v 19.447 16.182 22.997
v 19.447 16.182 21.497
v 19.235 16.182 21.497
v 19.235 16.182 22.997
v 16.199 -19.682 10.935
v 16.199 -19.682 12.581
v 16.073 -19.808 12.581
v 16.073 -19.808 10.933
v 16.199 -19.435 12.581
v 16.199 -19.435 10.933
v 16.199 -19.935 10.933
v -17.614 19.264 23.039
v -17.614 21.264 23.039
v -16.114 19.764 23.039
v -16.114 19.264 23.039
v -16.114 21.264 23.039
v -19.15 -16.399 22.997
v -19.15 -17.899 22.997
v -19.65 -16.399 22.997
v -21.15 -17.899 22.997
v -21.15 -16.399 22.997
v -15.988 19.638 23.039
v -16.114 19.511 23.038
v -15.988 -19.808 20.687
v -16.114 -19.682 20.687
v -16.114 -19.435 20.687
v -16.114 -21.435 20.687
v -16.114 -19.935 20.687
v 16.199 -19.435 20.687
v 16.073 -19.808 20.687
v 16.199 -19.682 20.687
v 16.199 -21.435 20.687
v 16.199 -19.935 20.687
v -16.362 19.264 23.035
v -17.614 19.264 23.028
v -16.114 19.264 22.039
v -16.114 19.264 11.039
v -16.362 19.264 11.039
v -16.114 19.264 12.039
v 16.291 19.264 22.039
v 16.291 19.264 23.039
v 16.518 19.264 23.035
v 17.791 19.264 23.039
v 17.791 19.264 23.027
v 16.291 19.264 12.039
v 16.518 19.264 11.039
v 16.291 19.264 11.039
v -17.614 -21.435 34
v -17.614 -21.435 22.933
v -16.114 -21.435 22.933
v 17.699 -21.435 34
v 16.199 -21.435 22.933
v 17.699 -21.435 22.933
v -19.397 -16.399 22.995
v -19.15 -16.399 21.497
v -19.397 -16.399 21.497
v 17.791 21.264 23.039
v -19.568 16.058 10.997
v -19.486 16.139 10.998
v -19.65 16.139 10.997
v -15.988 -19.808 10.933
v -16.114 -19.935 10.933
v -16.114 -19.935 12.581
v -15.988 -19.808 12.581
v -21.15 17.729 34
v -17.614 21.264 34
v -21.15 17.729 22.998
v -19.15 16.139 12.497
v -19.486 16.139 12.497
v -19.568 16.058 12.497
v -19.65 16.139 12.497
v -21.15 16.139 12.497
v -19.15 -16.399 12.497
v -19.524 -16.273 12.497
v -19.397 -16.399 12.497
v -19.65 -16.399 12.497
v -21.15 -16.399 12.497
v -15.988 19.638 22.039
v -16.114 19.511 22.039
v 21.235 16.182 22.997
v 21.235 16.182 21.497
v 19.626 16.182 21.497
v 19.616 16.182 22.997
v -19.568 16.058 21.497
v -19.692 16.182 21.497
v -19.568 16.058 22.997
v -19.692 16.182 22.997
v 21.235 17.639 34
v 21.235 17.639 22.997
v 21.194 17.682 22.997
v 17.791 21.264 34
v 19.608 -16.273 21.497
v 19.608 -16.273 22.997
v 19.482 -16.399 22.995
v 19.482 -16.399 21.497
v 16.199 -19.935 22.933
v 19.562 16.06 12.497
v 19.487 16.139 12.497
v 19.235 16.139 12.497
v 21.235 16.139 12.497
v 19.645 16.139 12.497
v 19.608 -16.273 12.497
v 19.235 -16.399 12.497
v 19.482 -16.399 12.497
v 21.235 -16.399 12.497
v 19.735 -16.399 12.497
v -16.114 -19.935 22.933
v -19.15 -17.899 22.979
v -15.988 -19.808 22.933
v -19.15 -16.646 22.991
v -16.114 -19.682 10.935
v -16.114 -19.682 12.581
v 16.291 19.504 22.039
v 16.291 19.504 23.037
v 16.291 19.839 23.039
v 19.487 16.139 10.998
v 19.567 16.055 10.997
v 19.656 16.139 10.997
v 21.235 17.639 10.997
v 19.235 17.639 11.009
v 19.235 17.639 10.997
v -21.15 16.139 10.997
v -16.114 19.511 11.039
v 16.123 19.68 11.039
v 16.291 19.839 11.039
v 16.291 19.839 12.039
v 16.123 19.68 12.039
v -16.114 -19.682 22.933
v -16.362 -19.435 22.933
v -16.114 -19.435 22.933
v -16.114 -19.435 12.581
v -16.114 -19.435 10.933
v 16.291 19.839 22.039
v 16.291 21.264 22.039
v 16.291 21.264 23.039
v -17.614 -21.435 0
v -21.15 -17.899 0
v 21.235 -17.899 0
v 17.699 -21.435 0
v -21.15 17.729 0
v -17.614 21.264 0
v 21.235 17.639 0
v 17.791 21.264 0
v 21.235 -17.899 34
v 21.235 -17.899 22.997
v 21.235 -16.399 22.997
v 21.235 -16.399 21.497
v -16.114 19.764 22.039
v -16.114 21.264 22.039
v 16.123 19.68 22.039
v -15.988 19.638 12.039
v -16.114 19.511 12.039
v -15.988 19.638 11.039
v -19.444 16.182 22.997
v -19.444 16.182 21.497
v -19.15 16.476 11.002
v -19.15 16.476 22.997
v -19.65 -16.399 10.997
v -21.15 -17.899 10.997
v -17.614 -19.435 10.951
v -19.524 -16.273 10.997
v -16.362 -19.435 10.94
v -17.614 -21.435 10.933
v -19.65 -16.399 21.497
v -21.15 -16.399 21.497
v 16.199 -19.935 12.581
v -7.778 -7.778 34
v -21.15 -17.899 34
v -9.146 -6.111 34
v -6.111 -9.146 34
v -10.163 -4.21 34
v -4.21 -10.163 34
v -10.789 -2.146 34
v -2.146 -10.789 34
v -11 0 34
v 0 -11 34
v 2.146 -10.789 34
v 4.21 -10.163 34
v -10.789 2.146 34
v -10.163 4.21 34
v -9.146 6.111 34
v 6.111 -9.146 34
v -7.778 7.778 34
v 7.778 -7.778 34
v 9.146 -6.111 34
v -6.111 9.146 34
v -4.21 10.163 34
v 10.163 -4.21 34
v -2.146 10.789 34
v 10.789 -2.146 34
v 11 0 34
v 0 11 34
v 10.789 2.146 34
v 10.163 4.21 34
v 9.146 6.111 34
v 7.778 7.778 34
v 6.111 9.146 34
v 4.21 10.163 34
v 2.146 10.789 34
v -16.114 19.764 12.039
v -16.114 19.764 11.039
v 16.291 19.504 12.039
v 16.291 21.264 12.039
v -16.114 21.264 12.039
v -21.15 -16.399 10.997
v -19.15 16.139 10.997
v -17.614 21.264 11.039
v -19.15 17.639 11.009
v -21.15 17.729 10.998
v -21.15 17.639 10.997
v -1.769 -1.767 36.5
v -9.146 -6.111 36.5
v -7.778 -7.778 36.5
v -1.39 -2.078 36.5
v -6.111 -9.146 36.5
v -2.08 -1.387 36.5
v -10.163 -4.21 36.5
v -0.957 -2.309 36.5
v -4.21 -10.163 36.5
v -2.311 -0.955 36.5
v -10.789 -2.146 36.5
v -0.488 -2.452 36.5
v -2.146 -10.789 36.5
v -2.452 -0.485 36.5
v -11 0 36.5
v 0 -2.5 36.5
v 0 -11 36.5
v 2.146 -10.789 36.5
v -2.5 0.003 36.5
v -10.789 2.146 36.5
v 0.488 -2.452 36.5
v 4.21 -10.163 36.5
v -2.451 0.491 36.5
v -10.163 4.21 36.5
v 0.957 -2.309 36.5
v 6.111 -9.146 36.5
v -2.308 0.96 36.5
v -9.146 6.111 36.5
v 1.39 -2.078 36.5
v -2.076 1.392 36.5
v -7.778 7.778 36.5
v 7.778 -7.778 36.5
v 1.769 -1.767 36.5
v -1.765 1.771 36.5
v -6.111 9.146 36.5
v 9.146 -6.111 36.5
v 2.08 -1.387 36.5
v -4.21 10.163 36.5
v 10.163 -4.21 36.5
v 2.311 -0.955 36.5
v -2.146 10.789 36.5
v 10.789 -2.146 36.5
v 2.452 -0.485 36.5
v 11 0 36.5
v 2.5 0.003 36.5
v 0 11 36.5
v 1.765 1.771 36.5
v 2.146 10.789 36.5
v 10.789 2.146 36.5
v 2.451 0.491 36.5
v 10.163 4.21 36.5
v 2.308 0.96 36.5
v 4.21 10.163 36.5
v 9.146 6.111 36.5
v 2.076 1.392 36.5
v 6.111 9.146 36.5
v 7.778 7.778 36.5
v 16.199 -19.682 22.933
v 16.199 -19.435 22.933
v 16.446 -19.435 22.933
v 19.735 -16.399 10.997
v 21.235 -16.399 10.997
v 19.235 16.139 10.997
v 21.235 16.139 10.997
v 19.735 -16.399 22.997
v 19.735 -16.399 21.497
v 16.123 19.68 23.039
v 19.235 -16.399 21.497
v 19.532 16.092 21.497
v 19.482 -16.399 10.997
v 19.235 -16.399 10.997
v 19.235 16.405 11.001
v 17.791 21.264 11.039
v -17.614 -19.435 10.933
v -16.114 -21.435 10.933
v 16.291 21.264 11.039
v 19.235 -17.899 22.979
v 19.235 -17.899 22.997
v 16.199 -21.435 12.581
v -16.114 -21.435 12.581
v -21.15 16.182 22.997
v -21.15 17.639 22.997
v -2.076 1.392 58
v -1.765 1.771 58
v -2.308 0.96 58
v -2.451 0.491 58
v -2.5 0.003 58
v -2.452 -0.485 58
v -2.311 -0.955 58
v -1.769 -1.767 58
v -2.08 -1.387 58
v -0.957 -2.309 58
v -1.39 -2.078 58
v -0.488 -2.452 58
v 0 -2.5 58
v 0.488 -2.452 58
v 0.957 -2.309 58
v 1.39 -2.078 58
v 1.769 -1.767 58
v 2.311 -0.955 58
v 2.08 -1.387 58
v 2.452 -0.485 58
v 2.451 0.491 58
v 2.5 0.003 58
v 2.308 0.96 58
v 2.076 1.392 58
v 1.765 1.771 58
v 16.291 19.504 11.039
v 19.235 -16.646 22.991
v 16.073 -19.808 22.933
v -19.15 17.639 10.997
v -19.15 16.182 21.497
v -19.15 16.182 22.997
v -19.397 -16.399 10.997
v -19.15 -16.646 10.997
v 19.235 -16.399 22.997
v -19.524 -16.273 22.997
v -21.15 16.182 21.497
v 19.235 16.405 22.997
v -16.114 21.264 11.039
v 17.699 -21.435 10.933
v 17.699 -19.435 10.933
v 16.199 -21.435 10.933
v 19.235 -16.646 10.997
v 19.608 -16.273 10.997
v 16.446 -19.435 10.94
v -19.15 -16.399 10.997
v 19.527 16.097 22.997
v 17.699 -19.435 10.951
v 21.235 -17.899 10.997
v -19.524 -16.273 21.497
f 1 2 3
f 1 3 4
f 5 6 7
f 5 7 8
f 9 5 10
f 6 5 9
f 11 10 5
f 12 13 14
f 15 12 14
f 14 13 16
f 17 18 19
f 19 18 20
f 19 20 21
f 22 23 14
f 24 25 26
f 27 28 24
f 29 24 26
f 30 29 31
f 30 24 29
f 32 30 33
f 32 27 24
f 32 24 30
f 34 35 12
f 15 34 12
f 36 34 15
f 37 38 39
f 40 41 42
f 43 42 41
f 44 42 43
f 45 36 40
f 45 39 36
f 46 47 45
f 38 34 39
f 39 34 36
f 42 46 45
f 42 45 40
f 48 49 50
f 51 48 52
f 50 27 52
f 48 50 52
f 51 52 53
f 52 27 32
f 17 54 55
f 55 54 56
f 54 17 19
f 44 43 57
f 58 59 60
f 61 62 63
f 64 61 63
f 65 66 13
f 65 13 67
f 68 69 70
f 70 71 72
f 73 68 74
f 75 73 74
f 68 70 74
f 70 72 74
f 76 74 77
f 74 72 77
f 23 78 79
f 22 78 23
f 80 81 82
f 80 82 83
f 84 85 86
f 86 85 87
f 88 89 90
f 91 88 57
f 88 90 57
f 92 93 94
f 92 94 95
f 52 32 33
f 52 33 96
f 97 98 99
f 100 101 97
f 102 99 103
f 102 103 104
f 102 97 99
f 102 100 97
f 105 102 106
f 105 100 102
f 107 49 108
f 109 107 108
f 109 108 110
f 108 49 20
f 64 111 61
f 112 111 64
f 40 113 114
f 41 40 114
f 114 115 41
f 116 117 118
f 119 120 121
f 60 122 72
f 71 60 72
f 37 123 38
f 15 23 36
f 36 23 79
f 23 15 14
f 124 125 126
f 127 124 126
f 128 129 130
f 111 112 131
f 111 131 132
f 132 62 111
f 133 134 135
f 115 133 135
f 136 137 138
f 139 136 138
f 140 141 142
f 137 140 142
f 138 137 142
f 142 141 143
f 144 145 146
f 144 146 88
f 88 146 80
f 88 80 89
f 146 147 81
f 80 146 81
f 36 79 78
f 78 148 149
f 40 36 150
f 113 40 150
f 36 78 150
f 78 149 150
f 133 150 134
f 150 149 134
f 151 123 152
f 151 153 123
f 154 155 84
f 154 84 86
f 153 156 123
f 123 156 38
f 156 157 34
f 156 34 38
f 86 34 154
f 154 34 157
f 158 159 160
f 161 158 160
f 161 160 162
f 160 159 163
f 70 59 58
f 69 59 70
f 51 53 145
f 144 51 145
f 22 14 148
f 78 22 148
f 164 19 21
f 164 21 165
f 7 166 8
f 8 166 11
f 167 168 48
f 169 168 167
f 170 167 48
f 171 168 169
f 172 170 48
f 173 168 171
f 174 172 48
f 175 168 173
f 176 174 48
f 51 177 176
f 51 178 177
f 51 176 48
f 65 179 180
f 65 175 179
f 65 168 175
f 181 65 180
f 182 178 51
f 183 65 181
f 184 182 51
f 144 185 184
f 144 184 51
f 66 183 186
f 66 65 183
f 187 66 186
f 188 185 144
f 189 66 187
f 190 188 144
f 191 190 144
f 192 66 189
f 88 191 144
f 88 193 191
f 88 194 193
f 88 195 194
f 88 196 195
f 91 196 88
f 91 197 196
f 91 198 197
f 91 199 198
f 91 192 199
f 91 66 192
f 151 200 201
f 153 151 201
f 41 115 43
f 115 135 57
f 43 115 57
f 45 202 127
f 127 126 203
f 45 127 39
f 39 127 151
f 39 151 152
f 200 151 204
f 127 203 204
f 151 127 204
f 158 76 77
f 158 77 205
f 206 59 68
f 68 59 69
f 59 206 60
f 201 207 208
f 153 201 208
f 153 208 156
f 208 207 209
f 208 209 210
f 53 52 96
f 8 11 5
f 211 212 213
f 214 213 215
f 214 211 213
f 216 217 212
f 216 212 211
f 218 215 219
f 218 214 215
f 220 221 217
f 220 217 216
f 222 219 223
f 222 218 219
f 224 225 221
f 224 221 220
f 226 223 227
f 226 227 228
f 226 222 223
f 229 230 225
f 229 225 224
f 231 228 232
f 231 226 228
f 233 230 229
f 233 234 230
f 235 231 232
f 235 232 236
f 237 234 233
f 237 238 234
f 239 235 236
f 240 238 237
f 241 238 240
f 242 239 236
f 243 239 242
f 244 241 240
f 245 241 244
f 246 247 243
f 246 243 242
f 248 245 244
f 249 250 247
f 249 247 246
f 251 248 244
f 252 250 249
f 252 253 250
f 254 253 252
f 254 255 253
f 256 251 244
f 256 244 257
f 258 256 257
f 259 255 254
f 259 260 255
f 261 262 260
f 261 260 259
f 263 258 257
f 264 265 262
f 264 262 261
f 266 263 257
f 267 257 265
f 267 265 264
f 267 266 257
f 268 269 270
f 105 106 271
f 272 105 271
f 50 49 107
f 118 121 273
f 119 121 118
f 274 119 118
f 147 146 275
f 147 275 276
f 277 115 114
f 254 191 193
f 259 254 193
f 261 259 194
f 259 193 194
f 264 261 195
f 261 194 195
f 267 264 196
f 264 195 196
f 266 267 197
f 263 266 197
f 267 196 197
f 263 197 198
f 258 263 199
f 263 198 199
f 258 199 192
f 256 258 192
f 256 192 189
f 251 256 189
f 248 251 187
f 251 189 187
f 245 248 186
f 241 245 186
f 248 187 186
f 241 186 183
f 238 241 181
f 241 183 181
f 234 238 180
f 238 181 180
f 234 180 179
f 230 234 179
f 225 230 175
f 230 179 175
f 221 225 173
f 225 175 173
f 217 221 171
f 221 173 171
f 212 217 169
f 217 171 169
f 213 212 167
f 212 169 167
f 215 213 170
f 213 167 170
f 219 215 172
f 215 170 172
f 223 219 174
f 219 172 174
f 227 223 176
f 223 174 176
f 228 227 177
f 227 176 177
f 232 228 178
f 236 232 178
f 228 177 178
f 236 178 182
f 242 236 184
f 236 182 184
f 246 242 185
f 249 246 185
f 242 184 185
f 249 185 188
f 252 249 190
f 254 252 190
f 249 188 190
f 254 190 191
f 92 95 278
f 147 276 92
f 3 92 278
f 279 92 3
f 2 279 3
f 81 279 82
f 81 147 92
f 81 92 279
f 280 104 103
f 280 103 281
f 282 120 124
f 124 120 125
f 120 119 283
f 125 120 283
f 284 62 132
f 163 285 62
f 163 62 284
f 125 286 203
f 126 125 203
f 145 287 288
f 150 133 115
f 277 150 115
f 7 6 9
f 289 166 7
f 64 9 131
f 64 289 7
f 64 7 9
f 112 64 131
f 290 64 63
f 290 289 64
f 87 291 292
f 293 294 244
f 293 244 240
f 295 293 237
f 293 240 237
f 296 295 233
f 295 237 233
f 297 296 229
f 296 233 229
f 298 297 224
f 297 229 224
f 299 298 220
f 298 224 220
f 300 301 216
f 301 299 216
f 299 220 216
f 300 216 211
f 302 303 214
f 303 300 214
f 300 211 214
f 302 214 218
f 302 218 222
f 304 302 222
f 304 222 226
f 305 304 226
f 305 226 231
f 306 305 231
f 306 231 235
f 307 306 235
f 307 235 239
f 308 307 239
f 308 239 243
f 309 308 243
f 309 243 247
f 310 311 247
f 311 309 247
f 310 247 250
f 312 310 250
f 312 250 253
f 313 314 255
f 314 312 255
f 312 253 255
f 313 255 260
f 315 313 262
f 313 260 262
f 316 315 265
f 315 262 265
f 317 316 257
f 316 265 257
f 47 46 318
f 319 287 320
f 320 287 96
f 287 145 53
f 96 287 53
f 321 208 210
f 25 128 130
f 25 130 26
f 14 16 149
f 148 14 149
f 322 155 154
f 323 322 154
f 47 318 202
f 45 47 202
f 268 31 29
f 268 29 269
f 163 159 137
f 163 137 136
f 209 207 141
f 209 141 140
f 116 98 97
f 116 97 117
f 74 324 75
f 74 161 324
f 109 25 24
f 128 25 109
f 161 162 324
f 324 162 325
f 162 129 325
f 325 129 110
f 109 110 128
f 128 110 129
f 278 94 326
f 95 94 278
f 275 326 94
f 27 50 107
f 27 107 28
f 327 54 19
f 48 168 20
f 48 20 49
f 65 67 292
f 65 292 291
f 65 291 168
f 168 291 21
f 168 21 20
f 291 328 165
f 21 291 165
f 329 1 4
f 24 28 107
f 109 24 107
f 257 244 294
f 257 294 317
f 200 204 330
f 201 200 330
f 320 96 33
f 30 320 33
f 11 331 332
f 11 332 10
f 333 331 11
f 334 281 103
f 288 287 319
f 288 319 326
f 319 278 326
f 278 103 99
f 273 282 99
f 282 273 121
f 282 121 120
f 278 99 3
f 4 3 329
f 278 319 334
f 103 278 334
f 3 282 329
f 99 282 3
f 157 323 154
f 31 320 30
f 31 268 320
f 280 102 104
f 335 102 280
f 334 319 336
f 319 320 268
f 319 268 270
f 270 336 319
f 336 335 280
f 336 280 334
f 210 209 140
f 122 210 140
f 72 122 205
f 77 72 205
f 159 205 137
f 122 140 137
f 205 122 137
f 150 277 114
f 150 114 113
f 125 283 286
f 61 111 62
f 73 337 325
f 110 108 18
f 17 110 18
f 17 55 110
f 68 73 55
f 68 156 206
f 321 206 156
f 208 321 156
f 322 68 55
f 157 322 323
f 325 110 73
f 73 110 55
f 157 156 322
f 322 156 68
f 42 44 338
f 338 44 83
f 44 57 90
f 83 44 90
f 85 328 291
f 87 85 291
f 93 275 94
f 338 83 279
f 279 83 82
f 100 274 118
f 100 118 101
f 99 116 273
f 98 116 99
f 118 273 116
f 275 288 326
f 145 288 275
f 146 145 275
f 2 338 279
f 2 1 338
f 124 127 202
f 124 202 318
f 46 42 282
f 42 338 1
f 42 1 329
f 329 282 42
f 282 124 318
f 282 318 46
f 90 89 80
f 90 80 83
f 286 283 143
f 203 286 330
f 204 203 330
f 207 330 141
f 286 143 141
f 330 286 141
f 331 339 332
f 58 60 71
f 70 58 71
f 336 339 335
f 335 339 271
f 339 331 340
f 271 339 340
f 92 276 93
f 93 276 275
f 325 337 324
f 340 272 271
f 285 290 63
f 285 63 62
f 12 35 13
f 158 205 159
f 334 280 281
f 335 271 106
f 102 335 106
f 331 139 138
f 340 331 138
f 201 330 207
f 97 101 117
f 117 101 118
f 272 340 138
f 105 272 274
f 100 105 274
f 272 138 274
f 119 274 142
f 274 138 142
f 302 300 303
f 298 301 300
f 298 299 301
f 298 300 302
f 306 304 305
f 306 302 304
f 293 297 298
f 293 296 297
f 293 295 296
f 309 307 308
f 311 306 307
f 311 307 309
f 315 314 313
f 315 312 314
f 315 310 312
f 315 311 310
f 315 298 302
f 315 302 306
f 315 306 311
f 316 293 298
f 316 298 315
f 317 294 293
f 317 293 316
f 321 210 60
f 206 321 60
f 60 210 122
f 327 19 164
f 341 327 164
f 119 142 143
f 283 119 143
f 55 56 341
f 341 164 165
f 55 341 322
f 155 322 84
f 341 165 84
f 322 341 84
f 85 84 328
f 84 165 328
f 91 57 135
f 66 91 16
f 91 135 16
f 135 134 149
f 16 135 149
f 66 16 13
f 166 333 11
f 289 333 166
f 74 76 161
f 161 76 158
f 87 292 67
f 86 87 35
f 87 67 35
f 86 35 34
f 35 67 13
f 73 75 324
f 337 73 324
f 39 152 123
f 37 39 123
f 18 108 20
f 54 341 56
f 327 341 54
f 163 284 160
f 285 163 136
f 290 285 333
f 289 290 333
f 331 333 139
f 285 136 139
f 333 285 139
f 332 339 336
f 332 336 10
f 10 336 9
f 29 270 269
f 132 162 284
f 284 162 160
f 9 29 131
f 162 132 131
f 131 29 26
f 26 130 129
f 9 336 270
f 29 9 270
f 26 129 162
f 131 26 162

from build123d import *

# Parameters (mm, degrees)
BOSS_EXTRUDE1_DEPTH = 34
SKETCH2_R           = 11
BOSS_EXTRUDE2_DEPTH = 2.5
SKETCH3_R           = 2.5
BOSS_EXTRUDE3_DEPTH = 21.5
CUT_EXTRUDE3_DEPTH  = 2
CUT_EXTRUDE4_DEPTH  = 2
CUT_EXTRUDE5_DEPTH  = 2.3
CUT_EXTRUDE6_DEPTH  = 2.3
CUT_EXTRUDE7_DEPTH  = 2
CUT_EXTRUDE9_DEPTH  = 2
CUT_EXTRUDE10_DEPTH = 2.3
CUT_EXTRUDE11_DEPTH = 2.3
CUT_EXTRUDE12_START = -21.5
CUT_EXTRUDE12_DEPTH = 21.5


with BuildPart() as part:
    # Sketch1 → Boss-Extrude1 (new body)
    with BuildSketch(Plane.XY):
        Polygon((-17.614466094, 21.264089132), (-21.15, 17.728555226), (-21.15, -17.899022103), (-17.614466094, -21.434556009), (17.699167724, -21.434556009), (21.23470163, -17.899022103), (21.23470163, 17.639412218), (17.790617242, 21.264089132), align=None)
    extrude(amount=BOSS_EXTRUDE1_DEPTH)

    # Sketch2 → Boss-Extrude2 (add)
    with BuildSketch(Plane.XY.offset(34)):
        Circle(SKETCH2_R)
    extrude(amount=BOSS_EXTRUDE2_DEPTH)

    # Sketch3 → Boss-Extrude3 (add)
    with BuildSketch(Plane.XY.offset(36.5)):
        Circle(SKETCH3_R)
    extrude(amount=BOSS_EXTRUDE3_DEPTH)

    # Sketch7 → Cut-Extrude3 (cut)
    with BuildSketch(Plane(origin=(21.23470163, 0, 0), x_dir=(0, 0, -1), z_dir=(1, 0, 0))):
        Polygon((-22.997396737, 17.681766019), (-10.997396737, 17.639412218), (-10.997396737, 16.139412218), (-12.497396737, 16.139412218), (-12.497396737, -16.399022103), (-10.997396737, -16.399022103), (-10.997396737, -17.899022103), (-22.997396737, -17.899022103), (-22.997396737, -16.399022103), (-21.497396737, -16.399022103), (-21.497396737, 16.181766019), (-22.997396737, 16.181766019), align=None)
    extrude(amount=-CUT_EXTRUDE3_DEPTH, mode=Mode.SUBTRACT)

    # Sketch6 → Cut-Extrude4 (cut)
    with BuildSketch(Plane(origin=(0, 21.264089132, 0), x_dir=(1, 0, 0), z_dir=(0, 1, 0))):
        Polygon((-17.614466094, -11.039491966), (-17.614466094, -23.039491966), (-16.114466094, -23.039491966), (-16.114466094, -22.039491966), (16.290617242, -22.039491966), (16.290617242, -23.039491966), (17.790617242, -23.039491966), (17.790617242, -11.039491966), (16.290617242, -11.039491966), (16.290617242, -12.039491966), (-16.114466094, -12.039491966), (-16.114466094, -11.039491966), align=None)
    extrude(amount=-CUT_EXTRUDE4_DEPTH, mode=Mode.SUBTRACT)

    # Sketch8 → Cut-Extrude5 (cut)
    with BuildSketch(Plane(origin=(19.96770094, 18.97284881, 0), x_dir=(0, 0, -1), z_dir=(0.724935382761137, 0.6888168775668638, 0))):
        Polygon((-23.039491966, 3.160613175), (-22.997396737, -1.780962582), (-10.997396737, -1.839386825), (-11.039491966, 3.160613175), align=None)
    extrude(amount=-CUT_EXTRUDE5_DEPTH, mode=Mode.SUBTRACT)

    # Sketch10 → Cut-Extrude6 (cut)
    with BuildSketch(Plane(origin=(19.566861866, -19.566861866, 0), x_dir=(0, 0, -1), z_dir=(0.707106781186553, -0.7071067811865421, 0))):
        Polygon((-22.997396737, 2.358681613), (-22.932662916, -2.641318387), (-10.932662916, -2.641318387), (-10.997396737, 2.358681613), align=None)
    extrude(amount=-CUT_EXTRUDE6_DEPTH, mode=Mode.SUBTRACT)

    # Sketch9 → Cut-Extrude7 (cut)
    with BuildSketch(Plane.XZ.offset(21.434556009)):
        Polygon((17.699167724, 22.932662916), (17.699167724, 10.932662916), (16.199167724, 10.932662916), (16.199167724, 12.580798856), (-16.114466094, 12.580798856), (-16.114466094, 10.932662916), (-17.614466094, 10.932662916), (-17.614466094, 22.932662916), (-16.114466094, 22.932662916), (-16.114466094, 20.686804388), (16.199167724, 20.686804388), (16.199167724, 22.932662916), align=None)
    extrude(amount=-CUT_EXTRUDE7_DEPTH, mode=Mode.SUBTRACT)

    # Sketch13 → Cut-Extrude9 (cut)
    with BuildSketch(Plane.ZY.offset(21.15)):
        Polygon((22.997396737, 17.639412218), (10.997396737, 17.639412218), (10.997396737, 16.139412218), (12.497396737, 16.139412218), (12.497396737, -16.399022103), (10.997396737, -16.399022103), (10.997396737, -17.899022103), (22.997396737, -17.899022103), (22.997396737, -16.399022103), (21.497396737, -16.399022103), (21.497396737, 16.181766019), (22.997396737, 16.181766019), align=None)
    extrude(amount=-CUT_EXTRUDE9_DEPTH, mode=Mode.SUBTRACT)

    # Sketch14 → Cut-Extrude10 (cut)
    with BuildSketch(Plane(origin=(-19.439277613, 19.439277613, 0), x_dir=(0, 0, 1), z_dir=(-0.707106781186543, 0.7071067811865521, 0))):
        Polygon((11.039491966, 2.580673199), (10.997396737, -2.482360427), (22.997396737, -2.482360427), (23.039491966, 2.580673199), align=None)
    extrude(amount=-CUT_EXTRUDE10_DEPTH, mode=Mode.SUBTRACT)

    # Sketch15 → Cut-Extrude11 (cut)
    with BuildSketch(Plane(origin=(-19.524511051, -19.524511051, 0), x_dir=(0, 0, 1), z_dir=(-0.7071067811865381, -0.707106781186557, 0))):
        Polygon((10.997396737, 2.298788516), (10.932662916, -2.701211484), (22.932662916, -2.701211484), (22.997396737, 2.298788516), align=None)
    extrude(amount=-CUT_EXTRUDE11_DEPTH, mode=Mode.SUBTRACT)

    # Sketch16 → Cut-Extrude12 (cut)
    with BuildSketch(Plane.XY.offset(58).offset(CUT_EXTRUDE12_START)):
        with BuildLine():
            Line((-1.764671013, 1.770857481), (1.764671013, 1.770857481))
            ThreePointArc((1.764671013, 1.770857481), (0, 2.5), (-1.764671013, 1.770857481))
        make_face()
    extrude(amount=CUT_EXTRUDE12_DEPTH, mode=Mode.SUBTRACT)


solid = part.part
